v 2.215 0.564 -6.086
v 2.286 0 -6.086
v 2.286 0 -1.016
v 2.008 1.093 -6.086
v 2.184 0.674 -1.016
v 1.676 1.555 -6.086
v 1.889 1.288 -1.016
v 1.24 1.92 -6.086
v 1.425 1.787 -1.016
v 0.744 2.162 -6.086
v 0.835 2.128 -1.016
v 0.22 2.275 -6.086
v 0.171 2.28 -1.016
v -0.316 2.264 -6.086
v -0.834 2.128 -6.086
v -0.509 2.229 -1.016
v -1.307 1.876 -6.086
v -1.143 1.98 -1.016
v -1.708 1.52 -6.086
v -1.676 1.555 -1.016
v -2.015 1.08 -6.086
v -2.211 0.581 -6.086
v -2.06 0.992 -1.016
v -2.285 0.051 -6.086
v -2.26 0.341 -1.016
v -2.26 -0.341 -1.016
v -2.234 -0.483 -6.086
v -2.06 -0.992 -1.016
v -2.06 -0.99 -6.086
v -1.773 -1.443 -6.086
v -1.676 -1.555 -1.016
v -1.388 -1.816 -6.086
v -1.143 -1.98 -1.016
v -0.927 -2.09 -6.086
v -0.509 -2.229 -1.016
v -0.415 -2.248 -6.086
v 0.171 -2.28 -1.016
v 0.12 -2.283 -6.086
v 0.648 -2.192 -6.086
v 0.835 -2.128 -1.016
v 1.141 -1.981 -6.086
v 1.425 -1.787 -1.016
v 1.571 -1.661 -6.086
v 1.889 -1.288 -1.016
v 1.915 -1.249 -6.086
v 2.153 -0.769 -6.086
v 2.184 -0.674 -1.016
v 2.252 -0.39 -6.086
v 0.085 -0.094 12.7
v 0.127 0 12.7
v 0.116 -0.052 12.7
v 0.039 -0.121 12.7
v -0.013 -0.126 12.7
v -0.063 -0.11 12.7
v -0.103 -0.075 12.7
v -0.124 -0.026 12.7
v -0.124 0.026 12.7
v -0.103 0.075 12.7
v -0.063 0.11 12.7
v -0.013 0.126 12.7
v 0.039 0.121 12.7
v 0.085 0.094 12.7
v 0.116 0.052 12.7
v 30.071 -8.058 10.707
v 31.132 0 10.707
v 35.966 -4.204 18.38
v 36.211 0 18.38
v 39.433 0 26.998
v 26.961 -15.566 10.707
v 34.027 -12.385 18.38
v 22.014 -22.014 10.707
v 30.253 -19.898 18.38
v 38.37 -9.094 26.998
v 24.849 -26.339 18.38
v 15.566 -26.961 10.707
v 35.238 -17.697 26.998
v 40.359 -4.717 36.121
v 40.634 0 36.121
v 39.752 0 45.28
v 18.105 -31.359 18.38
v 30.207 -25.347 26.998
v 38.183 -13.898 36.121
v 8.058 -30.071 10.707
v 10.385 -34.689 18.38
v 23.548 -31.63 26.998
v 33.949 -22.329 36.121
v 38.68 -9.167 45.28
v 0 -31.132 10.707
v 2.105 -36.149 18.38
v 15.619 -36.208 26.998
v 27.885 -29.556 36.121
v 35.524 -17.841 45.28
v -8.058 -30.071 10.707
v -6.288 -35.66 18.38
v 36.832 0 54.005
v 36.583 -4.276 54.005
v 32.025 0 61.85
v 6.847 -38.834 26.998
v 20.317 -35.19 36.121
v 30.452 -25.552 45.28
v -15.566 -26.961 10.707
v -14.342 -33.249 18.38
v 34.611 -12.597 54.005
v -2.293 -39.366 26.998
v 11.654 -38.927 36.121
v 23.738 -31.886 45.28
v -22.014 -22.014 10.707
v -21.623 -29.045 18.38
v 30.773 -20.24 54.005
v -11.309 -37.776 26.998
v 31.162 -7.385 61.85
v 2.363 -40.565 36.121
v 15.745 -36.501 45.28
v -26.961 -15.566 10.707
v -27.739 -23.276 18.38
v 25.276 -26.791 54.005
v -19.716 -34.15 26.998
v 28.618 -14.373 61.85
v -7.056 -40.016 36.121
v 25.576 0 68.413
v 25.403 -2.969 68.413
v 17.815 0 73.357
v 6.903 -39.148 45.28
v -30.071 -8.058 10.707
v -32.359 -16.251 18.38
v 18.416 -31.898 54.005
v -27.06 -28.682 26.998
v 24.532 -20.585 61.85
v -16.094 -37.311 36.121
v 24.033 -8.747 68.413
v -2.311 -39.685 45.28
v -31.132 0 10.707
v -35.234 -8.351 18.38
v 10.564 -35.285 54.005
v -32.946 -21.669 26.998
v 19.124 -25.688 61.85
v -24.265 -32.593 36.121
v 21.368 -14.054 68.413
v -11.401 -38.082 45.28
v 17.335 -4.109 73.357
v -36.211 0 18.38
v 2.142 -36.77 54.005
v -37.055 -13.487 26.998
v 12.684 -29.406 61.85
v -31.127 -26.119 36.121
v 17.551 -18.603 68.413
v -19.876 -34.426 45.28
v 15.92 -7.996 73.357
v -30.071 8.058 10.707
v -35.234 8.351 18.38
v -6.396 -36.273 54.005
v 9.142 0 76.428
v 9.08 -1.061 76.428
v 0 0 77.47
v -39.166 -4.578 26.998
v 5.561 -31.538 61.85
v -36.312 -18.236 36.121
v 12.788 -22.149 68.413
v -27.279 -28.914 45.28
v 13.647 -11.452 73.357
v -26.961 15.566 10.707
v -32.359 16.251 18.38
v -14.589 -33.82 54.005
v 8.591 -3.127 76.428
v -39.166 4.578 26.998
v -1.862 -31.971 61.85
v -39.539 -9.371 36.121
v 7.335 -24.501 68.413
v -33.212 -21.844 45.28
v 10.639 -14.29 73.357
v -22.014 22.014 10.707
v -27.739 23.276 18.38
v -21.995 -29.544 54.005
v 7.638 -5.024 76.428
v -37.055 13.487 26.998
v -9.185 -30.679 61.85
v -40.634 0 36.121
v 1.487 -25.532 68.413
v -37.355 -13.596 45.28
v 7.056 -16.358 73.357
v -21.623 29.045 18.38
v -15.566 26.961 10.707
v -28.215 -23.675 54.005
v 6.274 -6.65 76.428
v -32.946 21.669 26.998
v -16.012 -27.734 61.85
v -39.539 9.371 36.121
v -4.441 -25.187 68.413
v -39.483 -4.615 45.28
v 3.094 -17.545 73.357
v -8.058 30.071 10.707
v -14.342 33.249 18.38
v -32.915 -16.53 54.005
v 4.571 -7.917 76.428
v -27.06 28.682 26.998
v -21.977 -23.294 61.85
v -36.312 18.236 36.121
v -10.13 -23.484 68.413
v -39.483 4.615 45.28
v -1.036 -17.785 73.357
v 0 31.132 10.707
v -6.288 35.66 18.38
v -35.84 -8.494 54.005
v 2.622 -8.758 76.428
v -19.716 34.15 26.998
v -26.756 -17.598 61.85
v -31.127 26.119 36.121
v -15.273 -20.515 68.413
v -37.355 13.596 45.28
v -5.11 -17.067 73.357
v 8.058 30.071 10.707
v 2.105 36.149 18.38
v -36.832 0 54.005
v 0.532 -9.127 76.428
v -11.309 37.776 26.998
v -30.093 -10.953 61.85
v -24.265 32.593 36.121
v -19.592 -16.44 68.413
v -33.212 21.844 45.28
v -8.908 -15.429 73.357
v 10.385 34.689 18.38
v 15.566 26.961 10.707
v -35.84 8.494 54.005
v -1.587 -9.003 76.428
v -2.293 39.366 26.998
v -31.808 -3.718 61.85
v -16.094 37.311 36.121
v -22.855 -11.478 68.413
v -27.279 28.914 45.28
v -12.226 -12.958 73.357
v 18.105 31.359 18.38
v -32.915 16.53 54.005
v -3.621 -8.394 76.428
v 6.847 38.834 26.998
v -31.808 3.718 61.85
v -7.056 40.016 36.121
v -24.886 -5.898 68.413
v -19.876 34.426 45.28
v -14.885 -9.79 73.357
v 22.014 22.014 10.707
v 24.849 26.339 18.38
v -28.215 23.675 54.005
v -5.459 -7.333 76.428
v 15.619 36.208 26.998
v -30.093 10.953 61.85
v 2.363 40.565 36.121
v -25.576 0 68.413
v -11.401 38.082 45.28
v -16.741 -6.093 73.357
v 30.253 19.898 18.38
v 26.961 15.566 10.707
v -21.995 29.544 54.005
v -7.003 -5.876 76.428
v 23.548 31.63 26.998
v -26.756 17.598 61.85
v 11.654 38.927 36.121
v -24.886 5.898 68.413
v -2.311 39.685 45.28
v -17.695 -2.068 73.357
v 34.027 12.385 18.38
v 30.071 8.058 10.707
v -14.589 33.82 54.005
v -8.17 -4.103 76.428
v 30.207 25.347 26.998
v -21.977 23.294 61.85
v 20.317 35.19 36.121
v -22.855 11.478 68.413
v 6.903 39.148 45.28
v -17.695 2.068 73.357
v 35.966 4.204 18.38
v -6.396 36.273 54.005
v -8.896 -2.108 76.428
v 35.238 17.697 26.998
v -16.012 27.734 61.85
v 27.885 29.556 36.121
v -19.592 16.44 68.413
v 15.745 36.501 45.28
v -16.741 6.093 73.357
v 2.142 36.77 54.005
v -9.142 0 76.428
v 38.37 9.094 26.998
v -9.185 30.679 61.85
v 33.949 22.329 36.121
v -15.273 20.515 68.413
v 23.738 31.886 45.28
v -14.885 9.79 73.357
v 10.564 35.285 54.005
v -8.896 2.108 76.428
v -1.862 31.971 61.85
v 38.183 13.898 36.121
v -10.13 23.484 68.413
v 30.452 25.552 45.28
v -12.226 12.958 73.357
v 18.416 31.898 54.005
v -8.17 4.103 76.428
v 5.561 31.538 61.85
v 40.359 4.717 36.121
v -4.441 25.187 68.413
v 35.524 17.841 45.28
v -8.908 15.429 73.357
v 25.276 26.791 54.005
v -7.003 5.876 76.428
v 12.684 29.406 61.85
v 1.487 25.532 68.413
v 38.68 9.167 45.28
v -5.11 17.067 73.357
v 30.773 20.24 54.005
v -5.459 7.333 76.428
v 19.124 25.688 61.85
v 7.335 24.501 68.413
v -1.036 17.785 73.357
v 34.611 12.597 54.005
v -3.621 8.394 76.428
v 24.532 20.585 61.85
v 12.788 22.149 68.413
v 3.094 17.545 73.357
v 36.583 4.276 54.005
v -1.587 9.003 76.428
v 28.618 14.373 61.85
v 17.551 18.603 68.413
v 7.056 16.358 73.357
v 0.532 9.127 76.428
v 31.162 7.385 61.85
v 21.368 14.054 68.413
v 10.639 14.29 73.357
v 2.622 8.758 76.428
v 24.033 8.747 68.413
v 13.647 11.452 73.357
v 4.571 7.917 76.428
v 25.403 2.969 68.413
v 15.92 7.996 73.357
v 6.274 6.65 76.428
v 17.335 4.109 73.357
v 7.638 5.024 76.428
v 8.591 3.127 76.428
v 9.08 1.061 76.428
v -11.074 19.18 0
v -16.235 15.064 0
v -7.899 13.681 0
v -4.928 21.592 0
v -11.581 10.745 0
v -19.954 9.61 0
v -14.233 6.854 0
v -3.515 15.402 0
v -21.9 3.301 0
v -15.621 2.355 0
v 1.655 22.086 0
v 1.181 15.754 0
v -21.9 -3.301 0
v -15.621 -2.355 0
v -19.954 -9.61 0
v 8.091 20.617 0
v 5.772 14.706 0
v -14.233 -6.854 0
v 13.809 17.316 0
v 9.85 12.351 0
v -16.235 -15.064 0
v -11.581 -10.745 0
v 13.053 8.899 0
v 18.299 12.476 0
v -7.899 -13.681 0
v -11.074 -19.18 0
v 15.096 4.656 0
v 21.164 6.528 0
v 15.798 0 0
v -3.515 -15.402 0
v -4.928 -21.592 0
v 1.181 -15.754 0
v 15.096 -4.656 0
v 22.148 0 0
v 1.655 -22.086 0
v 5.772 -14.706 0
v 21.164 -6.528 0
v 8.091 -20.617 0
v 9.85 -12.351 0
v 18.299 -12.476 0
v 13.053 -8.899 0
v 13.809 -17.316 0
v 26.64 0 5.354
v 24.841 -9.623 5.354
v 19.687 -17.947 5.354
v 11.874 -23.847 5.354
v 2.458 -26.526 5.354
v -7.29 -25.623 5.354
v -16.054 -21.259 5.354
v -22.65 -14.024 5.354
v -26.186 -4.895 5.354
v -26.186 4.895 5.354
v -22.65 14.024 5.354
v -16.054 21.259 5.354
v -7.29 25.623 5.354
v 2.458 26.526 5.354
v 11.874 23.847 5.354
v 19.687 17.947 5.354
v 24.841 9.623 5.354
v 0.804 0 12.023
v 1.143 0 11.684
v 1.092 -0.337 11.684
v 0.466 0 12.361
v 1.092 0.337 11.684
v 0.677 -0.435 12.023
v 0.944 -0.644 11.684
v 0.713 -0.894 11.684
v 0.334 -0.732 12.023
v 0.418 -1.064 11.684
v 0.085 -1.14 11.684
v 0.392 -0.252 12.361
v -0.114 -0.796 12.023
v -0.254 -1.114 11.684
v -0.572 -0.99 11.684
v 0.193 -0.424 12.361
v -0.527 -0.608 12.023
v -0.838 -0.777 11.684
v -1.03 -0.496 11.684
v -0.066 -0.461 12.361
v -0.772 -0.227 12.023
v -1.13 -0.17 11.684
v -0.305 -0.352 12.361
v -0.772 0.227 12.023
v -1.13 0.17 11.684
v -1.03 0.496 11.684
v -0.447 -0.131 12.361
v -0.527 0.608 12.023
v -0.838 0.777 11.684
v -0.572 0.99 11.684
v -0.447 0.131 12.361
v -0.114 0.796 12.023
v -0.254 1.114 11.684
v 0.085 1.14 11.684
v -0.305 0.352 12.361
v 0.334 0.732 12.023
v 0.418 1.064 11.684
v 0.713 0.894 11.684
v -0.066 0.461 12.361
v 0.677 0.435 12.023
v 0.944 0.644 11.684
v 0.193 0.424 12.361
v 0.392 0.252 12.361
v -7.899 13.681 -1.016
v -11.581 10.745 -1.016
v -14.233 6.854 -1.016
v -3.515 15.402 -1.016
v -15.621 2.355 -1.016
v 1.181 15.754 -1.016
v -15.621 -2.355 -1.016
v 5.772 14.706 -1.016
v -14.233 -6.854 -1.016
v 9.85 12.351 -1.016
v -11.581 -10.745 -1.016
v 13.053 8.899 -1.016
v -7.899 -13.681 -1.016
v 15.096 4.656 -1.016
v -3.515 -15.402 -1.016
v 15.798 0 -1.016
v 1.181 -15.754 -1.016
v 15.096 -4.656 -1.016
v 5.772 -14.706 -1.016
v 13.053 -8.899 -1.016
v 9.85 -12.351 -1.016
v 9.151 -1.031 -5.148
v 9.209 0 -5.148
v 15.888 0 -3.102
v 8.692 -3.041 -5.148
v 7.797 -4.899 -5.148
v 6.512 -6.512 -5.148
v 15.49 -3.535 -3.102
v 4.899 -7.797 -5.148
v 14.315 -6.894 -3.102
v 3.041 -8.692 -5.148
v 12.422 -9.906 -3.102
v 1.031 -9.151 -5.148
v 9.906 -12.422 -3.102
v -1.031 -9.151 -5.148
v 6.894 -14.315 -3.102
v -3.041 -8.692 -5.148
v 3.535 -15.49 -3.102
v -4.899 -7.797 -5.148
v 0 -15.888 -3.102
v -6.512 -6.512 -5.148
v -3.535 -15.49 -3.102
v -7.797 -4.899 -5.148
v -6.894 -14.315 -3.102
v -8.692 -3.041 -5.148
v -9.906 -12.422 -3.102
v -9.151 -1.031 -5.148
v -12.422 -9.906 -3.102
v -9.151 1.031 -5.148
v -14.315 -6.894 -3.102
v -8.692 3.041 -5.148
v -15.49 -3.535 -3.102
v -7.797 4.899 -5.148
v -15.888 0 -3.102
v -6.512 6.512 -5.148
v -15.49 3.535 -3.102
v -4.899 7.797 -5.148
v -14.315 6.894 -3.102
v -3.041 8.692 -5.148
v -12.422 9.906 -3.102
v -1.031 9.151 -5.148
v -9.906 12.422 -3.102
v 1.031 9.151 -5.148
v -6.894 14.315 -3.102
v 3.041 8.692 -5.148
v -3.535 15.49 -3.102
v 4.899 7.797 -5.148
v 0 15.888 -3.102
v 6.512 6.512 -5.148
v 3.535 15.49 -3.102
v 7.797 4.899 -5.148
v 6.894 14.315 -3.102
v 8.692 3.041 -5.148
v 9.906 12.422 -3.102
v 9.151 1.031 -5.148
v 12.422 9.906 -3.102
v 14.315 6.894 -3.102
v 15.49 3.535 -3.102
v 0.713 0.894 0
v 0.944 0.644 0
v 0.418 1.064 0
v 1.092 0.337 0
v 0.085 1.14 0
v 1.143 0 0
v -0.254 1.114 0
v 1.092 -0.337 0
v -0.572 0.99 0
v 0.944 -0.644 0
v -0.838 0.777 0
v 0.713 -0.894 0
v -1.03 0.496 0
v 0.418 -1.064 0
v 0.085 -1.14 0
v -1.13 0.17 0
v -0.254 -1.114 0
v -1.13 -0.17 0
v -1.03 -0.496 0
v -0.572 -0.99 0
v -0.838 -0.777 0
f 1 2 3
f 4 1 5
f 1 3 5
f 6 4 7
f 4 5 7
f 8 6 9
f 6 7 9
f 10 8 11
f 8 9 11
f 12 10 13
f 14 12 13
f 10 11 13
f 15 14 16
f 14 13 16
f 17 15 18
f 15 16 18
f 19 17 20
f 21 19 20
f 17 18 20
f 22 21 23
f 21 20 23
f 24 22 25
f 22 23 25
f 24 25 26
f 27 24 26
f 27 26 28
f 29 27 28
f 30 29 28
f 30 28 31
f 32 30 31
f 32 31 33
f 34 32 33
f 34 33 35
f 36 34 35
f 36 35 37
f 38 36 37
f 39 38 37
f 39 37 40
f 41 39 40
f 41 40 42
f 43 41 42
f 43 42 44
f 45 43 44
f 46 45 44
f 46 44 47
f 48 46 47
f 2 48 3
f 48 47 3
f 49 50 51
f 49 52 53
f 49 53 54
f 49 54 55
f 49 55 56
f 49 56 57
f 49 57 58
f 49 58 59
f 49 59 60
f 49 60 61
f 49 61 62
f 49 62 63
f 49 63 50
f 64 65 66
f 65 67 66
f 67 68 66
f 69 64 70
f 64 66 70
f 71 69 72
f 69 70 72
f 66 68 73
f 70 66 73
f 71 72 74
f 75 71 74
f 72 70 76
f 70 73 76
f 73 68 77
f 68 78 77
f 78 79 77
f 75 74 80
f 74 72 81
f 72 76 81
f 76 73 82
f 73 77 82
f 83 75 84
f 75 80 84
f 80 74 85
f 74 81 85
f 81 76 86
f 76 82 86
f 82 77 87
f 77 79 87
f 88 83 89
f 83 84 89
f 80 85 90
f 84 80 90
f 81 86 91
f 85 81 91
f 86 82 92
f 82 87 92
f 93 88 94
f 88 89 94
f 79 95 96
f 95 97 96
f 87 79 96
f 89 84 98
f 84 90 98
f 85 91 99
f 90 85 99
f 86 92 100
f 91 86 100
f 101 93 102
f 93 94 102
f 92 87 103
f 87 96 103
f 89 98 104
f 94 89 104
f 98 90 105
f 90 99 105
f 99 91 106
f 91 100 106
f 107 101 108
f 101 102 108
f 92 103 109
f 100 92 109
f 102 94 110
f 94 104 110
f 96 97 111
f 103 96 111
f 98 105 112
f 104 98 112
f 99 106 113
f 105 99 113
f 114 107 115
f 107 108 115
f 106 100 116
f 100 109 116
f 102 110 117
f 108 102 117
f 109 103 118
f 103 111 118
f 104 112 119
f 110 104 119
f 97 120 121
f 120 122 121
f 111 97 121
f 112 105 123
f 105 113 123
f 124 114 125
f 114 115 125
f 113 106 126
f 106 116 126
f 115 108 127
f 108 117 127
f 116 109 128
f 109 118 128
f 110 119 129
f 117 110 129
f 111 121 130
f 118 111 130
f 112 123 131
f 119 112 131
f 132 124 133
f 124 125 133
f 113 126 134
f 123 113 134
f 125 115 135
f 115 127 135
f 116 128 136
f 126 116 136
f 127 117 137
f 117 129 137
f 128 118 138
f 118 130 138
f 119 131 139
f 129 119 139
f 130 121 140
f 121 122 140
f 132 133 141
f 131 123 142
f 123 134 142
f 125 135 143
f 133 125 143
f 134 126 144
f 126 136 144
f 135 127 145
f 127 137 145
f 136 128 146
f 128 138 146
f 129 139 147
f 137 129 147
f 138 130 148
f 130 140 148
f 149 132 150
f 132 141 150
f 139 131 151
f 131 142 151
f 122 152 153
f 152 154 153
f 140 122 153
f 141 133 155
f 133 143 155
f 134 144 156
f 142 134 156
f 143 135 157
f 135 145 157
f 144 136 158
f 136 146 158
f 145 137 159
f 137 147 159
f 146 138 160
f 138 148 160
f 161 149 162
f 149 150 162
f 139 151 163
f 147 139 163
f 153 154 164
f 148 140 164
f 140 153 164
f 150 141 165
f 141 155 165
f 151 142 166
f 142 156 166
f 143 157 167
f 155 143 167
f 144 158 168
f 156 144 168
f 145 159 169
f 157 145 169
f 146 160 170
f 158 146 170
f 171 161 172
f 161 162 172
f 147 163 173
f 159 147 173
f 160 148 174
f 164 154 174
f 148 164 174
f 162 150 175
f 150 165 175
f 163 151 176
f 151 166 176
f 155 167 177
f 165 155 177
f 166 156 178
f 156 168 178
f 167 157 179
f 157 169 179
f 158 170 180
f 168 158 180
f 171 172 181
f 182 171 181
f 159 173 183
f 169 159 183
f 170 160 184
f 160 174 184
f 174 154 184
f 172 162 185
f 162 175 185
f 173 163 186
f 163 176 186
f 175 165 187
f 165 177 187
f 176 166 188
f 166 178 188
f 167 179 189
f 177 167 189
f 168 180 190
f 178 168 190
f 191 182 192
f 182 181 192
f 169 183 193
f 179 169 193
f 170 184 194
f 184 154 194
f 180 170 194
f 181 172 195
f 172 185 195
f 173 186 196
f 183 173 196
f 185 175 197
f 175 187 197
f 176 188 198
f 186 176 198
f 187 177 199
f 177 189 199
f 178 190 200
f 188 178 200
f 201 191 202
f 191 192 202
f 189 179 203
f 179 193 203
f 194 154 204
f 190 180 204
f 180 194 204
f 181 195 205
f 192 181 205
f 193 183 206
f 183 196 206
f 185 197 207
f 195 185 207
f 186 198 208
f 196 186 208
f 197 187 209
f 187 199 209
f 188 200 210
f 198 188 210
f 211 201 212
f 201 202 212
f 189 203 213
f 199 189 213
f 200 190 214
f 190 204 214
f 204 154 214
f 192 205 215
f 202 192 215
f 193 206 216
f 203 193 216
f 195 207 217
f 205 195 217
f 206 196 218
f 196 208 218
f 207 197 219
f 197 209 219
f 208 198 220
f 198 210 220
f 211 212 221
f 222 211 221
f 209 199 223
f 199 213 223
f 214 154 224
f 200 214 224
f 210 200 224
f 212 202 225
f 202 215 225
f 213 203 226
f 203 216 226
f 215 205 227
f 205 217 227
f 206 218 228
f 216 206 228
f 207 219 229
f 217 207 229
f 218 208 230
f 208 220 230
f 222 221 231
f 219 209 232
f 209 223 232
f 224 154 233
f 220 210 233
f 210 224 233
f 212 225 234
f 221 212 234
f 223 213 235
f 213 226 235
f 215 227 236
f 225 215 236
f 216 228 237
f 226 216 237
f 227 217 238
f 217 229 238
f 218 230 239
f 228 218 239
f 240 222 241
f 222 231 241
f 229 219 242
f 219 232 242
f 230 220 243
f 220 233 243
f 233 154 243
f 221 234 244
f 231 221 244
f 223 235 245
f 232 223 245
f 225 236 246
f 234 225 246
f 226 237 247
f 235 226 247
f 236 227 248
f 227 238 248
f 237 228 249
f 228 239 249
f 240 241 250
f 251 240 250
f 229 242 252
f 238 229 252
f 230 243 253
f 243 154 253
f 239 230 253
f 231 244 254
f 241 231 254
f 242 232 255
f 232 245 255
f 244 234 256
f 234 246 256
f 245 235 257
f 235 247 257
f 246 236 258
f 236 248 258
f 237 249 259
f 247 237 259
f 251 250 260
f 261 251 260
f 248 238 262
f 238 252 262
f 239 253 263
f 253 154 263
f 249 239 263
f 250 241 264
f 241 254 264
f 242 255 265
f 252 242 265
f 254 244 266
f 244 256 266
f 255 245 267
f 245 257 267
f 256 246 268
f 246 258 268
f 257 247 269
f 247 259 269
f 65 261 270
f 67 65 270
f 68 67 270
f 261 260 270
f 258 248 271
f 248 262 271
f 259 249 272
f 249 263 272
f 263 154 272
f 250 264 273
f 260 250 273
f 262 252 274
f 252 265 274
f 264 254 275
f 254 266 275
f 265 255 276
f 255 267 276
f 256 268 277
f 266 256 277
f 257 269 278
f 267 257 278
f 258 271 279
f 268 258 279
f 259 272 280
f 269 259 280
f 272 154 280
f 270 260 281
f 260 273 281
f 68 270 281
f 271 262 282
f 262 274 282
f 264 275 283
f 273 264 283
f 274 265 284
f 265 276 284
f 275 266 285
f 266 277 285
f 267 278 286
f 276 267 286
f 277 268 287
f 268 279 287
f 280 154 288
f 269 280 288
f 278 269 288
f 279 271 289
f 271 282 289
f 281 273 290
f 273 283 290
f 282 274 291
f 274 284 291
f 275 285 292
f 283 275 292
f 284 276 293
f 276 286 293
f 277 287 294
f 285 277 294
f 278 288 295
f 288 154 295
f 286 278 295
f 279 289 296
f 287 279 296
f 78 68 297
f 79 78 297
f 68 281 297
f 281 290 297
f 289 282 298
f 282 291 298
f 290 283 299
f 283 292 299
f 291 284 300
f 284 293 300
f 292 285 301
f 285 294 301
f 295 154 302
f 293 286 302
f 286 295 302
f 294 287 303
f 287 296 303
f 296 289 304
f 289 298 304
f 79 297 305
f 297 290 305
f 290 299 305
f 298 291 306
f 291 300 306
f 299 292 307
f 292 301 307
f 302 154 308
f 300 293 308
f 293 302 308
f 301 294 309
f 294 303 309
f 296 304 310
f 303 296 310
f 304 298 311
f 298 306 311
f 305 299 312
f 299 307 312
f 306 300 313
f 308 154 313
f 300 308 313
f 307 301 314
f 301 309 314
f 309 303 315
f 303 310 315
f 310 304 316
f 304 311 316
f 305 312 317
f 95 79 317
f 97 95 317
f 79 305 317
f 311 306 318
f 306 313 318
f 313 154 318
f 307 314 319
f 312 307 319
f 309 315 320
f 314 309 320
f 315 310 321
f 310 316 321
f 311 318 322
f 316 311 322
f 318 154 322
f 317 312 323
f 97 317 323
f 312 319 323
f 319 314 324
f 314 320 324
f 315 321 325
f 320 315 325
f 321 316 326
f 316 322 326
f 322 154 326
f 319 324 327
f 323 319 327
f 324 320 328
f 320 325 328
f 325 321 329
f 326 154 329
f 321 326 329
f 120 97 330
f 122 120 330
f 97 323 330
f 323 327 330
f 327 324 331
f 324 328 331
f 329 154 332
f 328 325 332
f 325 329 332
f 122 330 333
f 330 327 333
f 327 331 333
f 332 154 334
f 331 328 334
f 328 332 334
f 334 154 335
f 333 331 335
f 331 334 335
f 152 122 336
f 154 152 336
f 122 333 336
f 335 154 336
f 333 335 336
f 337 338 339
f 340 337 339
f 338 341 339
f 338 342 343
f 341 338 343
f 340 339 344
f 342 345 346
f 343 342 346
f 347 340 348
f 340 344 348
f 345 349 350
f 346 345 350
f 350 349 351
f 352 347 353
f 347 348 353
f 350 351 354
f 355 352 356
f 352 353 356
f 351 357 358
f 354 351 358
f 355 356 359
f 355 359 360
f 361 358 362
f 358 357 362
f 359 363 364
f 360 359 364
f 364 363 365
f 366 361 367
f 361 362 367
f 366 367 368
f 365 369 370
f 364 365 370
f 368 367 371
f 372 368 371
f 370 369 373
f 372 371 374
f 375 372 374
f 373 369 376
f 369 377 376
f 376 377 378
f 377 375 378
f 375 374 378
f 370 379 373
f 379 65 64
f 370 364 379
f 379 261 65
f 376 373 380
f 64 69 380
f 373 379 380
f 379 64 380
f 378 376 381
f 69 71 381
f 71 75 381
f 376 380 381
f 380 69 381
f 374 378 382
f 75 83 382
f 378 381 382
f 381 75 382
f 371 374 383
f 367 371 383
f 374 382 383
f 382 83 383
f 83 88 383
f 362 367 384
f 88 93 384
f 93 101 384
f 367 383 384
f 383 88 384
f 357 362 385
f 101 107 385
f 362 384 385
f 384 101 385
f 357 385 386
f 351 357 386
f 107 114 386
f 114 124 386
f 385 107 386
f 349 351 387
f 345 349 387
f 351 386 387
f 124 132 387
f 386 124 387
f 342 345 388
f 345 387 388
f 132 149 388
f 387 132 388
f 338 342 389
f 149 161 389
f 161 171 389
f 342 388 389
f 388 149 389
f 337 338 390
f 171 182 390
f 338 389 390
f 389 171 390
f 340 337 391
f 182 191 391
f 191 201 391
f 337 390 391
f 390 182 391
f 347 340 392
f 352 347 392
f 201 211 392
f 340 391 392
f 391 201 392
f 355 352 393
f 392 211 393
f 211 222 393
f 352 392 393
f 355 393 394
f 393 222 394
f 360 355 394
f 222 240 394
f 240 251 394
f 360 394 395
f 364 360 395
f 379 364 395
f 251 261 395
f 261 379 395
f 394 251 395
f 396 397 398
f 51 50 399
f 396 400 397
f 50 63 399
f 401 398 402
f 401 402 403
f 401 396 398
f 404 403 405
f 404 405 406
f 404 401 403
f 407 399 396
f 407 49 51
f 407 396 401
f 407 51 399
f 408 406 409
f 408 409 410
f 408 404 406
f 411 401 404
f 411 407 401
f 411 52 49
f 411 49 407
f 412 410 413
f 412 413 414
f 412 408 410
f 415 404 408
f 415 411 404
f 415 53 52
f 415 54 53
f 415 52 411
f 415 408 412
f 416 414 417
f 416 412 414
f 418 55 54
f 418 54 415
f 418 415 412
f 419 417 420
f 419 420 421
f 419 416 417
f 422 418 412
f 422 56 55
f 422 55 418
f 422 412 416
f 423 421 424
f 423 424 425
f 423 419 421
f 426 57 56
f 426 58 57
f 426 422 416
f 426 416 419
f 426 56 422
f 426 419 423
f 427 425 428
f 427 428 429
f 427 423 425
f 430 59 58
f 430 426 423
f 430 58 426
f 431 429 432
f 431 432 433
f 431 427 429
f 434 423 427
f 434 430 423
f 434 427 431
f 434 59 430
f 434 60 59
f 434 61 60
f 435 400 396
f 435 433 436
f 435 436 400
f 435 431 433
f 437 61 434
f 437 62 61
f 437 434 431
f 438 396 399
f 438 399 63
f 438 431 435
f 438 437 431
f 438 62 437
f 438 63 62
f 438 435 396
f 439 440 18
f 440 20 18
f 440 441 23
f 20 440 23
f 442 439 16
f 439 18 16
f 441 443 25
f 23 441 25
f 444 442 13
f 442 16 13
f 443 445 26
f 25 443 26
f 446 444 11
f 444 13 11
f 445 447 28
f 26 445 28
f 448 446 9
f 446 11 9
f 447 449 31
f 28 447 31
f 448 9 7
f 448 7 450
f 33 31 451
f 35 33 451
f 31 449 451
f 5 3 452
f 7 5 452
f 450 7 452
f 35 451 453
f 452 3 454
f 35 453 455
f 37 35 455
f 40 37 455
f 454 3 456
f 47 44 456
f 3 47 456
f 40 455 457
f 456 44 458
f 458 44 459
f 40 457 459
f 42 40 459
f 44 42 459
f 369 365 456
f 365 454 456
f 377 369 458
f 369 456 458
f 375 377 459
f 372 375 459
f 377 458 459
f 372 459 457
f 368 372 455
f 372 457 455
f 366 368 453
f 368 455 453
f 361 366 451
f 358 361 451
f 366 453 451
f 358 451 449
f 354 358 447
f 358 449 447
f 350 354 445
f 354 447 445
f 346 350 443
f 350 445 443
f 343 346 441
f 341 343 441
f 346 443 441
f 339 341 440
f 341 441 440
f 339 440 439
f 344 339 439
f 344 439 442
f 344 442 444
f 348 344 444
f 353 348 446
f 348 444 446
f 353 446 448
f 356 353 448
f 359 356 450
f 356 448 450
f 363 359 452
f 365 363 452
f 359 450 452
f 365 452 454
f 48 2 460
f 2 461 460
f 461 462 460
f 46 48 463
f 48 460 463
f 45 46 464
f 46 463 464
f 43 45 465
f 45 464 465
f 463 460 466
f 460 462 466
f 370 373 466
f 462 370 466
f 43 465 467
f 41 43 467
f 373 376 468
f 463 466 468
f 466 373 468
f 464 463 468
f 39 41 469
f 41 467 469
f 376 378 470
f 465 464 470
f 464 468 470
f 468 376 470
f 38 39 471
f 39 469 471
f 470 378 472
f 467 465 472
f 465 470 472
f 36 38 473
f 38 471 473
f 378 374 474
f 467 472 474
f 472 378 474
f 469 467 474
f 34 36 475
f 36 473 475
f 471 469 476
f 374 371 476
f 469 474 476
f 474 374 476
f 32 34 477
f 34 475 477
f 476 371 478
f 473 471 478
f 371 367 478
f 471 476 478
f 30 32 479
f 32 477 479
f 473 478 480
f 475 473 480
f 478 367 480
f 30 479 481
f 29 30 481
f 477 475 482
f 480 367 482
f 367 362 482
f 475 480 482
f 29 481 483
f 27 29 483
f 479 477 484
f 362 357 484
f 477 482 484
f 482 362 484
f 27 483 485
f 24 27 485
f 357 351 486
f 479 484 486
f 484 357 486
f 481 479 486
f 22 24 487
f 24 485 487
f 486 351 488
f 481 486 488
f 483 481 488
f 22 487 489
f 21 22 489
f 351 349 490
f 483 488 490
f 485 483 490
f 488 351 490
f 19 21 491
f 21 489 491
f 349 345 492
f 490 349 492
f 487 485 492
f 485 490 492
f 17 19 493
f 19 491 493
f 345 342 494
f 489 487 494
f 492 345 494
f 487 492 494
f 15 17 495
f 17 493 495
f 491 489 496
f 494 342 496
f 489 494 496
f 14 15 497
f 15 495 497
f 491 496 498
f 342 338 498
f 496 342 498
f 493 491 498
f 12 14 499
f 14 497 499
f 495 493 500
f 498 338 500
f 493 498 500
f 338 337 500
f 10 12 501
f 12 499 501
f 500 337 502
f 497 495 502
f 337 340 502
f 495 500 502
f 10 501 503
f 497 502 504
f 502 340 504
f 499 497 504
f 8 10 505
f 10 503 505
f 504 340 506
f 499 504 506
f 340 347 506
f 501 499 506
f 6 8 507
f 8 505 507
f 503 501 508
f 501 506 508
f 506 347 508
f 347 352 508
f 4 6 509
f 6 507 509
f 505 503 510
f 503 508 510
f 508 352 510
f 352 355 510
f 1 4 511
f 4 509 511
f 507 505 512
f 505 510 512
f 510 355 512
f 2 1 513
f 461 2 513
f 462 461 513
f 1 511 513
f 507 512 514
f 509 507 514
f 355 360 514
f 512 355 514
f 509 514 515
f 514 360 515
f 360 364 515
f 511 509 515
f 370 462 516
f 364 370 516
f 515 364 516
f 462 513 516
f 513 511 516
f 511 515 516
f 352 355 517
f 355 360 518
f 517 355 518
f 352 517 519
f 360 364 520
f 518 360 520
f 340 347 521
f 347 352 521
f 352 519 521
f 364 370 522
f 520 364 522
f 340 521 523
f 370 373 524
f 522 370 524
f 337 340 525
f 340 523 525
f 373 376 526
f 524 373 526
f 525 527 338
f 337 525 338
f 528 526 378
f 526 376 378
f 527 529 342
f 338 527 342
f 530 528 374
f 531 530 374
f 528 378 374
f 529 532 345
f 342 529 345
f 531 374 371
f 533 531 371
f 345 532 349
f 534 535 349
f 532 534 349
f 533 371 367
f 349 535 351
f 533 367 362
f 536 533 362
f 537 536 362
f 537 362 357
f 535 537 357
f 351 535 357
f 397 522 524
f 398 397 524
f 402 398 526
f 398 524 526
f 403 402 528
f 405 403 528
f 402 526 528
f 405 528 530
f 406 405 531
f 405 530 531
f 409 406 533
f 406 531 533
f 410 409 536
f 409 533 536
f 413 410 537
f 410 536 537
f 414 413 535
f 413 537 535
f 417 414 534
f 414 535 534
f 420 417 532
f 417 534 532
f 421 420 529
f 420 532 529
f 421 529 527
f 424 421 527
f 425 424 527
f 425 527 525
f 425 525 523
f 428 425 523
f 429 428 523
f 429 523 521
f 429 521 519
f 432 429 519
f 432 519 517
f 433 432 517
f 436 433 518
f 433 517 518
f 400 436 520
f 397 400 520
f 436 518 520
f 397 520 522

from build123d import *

# Parameters (mm, degrees)
F2_R     = 1.143
F3_DEPTH = 12.7
F4_SIZE  = 1.016
F7_R     = 2.286
F8_DEPTH = 25.4


# Not quite as in the source:
# - a feature names something its author has since deleted; it is built from what else it names


with BuildPart() as f1:
    # F0 (on Front) → F1 (revolve)
    with BuildSketch(Plane.XZ):
        with BuildLine():
            Line((22.1477128222, 0), (31.1320461684, 10.7071115423))
            ThreePointArc((31.1320461684, 10.7071115423), (36.8323484652, 54.0052061571), (0, 77.47))
            Line((0, 77.47), (0, 0))
            Line((0, 0), (22.1477128222, 0))
        make_face()
    revolve(axis=Axis((0, 0, -28.7515761617), (0, 0, -1)))

    # F2 (on face) → F3 (cut)
    with BuildSketch(Plane(origin=(0, 0, 0), x_dir=(1, 0, 0), z_dir=(0, 0, -1))):
        Circle(F2_R)
    extrude(amount=-F3_DEPTH, mode=Mode.SUBTRACT)

    # F4
    f4_edges = [f1.edges().sort_by_distance(p)[0] for p in [
        (-1.143, 0, 12.7),
    ]]
    chamfer(f4_edges, length=F4_SIZE)


with BuildPart() as f6:
    # F5 (on Front) → F6 (revolve)
    with BuildSketch(Plane.XZ):
        with BuildLine():
            Line((0, -1.016), (0, -6.1463898351))
            ThreePointArc((0, -6.1463898351), (11.4923810768, -4.5812938755), (22.1477128222, 0))
            Line((22.1477128222, 0), (15.7977128222, 0))
            Line((15.7977128222, 0), (15.7977128222, -1.016))
            Line((15.7977128222, -1.016), (0, -1.016))
        make_face()
    revolve(axis=Axis((0, 0, -28.7515761617), (0, 0, -1)))

    # F7 (on face) → F8 (cut)
    with BuildSketch(Plane.XY.offset(-1.016)):
        Circle(F7_R)
    extrude(amount=-F8_DEPTH, mode=Mode.SUBTRACT)


solid = Compound([f1.part, f6.part])
